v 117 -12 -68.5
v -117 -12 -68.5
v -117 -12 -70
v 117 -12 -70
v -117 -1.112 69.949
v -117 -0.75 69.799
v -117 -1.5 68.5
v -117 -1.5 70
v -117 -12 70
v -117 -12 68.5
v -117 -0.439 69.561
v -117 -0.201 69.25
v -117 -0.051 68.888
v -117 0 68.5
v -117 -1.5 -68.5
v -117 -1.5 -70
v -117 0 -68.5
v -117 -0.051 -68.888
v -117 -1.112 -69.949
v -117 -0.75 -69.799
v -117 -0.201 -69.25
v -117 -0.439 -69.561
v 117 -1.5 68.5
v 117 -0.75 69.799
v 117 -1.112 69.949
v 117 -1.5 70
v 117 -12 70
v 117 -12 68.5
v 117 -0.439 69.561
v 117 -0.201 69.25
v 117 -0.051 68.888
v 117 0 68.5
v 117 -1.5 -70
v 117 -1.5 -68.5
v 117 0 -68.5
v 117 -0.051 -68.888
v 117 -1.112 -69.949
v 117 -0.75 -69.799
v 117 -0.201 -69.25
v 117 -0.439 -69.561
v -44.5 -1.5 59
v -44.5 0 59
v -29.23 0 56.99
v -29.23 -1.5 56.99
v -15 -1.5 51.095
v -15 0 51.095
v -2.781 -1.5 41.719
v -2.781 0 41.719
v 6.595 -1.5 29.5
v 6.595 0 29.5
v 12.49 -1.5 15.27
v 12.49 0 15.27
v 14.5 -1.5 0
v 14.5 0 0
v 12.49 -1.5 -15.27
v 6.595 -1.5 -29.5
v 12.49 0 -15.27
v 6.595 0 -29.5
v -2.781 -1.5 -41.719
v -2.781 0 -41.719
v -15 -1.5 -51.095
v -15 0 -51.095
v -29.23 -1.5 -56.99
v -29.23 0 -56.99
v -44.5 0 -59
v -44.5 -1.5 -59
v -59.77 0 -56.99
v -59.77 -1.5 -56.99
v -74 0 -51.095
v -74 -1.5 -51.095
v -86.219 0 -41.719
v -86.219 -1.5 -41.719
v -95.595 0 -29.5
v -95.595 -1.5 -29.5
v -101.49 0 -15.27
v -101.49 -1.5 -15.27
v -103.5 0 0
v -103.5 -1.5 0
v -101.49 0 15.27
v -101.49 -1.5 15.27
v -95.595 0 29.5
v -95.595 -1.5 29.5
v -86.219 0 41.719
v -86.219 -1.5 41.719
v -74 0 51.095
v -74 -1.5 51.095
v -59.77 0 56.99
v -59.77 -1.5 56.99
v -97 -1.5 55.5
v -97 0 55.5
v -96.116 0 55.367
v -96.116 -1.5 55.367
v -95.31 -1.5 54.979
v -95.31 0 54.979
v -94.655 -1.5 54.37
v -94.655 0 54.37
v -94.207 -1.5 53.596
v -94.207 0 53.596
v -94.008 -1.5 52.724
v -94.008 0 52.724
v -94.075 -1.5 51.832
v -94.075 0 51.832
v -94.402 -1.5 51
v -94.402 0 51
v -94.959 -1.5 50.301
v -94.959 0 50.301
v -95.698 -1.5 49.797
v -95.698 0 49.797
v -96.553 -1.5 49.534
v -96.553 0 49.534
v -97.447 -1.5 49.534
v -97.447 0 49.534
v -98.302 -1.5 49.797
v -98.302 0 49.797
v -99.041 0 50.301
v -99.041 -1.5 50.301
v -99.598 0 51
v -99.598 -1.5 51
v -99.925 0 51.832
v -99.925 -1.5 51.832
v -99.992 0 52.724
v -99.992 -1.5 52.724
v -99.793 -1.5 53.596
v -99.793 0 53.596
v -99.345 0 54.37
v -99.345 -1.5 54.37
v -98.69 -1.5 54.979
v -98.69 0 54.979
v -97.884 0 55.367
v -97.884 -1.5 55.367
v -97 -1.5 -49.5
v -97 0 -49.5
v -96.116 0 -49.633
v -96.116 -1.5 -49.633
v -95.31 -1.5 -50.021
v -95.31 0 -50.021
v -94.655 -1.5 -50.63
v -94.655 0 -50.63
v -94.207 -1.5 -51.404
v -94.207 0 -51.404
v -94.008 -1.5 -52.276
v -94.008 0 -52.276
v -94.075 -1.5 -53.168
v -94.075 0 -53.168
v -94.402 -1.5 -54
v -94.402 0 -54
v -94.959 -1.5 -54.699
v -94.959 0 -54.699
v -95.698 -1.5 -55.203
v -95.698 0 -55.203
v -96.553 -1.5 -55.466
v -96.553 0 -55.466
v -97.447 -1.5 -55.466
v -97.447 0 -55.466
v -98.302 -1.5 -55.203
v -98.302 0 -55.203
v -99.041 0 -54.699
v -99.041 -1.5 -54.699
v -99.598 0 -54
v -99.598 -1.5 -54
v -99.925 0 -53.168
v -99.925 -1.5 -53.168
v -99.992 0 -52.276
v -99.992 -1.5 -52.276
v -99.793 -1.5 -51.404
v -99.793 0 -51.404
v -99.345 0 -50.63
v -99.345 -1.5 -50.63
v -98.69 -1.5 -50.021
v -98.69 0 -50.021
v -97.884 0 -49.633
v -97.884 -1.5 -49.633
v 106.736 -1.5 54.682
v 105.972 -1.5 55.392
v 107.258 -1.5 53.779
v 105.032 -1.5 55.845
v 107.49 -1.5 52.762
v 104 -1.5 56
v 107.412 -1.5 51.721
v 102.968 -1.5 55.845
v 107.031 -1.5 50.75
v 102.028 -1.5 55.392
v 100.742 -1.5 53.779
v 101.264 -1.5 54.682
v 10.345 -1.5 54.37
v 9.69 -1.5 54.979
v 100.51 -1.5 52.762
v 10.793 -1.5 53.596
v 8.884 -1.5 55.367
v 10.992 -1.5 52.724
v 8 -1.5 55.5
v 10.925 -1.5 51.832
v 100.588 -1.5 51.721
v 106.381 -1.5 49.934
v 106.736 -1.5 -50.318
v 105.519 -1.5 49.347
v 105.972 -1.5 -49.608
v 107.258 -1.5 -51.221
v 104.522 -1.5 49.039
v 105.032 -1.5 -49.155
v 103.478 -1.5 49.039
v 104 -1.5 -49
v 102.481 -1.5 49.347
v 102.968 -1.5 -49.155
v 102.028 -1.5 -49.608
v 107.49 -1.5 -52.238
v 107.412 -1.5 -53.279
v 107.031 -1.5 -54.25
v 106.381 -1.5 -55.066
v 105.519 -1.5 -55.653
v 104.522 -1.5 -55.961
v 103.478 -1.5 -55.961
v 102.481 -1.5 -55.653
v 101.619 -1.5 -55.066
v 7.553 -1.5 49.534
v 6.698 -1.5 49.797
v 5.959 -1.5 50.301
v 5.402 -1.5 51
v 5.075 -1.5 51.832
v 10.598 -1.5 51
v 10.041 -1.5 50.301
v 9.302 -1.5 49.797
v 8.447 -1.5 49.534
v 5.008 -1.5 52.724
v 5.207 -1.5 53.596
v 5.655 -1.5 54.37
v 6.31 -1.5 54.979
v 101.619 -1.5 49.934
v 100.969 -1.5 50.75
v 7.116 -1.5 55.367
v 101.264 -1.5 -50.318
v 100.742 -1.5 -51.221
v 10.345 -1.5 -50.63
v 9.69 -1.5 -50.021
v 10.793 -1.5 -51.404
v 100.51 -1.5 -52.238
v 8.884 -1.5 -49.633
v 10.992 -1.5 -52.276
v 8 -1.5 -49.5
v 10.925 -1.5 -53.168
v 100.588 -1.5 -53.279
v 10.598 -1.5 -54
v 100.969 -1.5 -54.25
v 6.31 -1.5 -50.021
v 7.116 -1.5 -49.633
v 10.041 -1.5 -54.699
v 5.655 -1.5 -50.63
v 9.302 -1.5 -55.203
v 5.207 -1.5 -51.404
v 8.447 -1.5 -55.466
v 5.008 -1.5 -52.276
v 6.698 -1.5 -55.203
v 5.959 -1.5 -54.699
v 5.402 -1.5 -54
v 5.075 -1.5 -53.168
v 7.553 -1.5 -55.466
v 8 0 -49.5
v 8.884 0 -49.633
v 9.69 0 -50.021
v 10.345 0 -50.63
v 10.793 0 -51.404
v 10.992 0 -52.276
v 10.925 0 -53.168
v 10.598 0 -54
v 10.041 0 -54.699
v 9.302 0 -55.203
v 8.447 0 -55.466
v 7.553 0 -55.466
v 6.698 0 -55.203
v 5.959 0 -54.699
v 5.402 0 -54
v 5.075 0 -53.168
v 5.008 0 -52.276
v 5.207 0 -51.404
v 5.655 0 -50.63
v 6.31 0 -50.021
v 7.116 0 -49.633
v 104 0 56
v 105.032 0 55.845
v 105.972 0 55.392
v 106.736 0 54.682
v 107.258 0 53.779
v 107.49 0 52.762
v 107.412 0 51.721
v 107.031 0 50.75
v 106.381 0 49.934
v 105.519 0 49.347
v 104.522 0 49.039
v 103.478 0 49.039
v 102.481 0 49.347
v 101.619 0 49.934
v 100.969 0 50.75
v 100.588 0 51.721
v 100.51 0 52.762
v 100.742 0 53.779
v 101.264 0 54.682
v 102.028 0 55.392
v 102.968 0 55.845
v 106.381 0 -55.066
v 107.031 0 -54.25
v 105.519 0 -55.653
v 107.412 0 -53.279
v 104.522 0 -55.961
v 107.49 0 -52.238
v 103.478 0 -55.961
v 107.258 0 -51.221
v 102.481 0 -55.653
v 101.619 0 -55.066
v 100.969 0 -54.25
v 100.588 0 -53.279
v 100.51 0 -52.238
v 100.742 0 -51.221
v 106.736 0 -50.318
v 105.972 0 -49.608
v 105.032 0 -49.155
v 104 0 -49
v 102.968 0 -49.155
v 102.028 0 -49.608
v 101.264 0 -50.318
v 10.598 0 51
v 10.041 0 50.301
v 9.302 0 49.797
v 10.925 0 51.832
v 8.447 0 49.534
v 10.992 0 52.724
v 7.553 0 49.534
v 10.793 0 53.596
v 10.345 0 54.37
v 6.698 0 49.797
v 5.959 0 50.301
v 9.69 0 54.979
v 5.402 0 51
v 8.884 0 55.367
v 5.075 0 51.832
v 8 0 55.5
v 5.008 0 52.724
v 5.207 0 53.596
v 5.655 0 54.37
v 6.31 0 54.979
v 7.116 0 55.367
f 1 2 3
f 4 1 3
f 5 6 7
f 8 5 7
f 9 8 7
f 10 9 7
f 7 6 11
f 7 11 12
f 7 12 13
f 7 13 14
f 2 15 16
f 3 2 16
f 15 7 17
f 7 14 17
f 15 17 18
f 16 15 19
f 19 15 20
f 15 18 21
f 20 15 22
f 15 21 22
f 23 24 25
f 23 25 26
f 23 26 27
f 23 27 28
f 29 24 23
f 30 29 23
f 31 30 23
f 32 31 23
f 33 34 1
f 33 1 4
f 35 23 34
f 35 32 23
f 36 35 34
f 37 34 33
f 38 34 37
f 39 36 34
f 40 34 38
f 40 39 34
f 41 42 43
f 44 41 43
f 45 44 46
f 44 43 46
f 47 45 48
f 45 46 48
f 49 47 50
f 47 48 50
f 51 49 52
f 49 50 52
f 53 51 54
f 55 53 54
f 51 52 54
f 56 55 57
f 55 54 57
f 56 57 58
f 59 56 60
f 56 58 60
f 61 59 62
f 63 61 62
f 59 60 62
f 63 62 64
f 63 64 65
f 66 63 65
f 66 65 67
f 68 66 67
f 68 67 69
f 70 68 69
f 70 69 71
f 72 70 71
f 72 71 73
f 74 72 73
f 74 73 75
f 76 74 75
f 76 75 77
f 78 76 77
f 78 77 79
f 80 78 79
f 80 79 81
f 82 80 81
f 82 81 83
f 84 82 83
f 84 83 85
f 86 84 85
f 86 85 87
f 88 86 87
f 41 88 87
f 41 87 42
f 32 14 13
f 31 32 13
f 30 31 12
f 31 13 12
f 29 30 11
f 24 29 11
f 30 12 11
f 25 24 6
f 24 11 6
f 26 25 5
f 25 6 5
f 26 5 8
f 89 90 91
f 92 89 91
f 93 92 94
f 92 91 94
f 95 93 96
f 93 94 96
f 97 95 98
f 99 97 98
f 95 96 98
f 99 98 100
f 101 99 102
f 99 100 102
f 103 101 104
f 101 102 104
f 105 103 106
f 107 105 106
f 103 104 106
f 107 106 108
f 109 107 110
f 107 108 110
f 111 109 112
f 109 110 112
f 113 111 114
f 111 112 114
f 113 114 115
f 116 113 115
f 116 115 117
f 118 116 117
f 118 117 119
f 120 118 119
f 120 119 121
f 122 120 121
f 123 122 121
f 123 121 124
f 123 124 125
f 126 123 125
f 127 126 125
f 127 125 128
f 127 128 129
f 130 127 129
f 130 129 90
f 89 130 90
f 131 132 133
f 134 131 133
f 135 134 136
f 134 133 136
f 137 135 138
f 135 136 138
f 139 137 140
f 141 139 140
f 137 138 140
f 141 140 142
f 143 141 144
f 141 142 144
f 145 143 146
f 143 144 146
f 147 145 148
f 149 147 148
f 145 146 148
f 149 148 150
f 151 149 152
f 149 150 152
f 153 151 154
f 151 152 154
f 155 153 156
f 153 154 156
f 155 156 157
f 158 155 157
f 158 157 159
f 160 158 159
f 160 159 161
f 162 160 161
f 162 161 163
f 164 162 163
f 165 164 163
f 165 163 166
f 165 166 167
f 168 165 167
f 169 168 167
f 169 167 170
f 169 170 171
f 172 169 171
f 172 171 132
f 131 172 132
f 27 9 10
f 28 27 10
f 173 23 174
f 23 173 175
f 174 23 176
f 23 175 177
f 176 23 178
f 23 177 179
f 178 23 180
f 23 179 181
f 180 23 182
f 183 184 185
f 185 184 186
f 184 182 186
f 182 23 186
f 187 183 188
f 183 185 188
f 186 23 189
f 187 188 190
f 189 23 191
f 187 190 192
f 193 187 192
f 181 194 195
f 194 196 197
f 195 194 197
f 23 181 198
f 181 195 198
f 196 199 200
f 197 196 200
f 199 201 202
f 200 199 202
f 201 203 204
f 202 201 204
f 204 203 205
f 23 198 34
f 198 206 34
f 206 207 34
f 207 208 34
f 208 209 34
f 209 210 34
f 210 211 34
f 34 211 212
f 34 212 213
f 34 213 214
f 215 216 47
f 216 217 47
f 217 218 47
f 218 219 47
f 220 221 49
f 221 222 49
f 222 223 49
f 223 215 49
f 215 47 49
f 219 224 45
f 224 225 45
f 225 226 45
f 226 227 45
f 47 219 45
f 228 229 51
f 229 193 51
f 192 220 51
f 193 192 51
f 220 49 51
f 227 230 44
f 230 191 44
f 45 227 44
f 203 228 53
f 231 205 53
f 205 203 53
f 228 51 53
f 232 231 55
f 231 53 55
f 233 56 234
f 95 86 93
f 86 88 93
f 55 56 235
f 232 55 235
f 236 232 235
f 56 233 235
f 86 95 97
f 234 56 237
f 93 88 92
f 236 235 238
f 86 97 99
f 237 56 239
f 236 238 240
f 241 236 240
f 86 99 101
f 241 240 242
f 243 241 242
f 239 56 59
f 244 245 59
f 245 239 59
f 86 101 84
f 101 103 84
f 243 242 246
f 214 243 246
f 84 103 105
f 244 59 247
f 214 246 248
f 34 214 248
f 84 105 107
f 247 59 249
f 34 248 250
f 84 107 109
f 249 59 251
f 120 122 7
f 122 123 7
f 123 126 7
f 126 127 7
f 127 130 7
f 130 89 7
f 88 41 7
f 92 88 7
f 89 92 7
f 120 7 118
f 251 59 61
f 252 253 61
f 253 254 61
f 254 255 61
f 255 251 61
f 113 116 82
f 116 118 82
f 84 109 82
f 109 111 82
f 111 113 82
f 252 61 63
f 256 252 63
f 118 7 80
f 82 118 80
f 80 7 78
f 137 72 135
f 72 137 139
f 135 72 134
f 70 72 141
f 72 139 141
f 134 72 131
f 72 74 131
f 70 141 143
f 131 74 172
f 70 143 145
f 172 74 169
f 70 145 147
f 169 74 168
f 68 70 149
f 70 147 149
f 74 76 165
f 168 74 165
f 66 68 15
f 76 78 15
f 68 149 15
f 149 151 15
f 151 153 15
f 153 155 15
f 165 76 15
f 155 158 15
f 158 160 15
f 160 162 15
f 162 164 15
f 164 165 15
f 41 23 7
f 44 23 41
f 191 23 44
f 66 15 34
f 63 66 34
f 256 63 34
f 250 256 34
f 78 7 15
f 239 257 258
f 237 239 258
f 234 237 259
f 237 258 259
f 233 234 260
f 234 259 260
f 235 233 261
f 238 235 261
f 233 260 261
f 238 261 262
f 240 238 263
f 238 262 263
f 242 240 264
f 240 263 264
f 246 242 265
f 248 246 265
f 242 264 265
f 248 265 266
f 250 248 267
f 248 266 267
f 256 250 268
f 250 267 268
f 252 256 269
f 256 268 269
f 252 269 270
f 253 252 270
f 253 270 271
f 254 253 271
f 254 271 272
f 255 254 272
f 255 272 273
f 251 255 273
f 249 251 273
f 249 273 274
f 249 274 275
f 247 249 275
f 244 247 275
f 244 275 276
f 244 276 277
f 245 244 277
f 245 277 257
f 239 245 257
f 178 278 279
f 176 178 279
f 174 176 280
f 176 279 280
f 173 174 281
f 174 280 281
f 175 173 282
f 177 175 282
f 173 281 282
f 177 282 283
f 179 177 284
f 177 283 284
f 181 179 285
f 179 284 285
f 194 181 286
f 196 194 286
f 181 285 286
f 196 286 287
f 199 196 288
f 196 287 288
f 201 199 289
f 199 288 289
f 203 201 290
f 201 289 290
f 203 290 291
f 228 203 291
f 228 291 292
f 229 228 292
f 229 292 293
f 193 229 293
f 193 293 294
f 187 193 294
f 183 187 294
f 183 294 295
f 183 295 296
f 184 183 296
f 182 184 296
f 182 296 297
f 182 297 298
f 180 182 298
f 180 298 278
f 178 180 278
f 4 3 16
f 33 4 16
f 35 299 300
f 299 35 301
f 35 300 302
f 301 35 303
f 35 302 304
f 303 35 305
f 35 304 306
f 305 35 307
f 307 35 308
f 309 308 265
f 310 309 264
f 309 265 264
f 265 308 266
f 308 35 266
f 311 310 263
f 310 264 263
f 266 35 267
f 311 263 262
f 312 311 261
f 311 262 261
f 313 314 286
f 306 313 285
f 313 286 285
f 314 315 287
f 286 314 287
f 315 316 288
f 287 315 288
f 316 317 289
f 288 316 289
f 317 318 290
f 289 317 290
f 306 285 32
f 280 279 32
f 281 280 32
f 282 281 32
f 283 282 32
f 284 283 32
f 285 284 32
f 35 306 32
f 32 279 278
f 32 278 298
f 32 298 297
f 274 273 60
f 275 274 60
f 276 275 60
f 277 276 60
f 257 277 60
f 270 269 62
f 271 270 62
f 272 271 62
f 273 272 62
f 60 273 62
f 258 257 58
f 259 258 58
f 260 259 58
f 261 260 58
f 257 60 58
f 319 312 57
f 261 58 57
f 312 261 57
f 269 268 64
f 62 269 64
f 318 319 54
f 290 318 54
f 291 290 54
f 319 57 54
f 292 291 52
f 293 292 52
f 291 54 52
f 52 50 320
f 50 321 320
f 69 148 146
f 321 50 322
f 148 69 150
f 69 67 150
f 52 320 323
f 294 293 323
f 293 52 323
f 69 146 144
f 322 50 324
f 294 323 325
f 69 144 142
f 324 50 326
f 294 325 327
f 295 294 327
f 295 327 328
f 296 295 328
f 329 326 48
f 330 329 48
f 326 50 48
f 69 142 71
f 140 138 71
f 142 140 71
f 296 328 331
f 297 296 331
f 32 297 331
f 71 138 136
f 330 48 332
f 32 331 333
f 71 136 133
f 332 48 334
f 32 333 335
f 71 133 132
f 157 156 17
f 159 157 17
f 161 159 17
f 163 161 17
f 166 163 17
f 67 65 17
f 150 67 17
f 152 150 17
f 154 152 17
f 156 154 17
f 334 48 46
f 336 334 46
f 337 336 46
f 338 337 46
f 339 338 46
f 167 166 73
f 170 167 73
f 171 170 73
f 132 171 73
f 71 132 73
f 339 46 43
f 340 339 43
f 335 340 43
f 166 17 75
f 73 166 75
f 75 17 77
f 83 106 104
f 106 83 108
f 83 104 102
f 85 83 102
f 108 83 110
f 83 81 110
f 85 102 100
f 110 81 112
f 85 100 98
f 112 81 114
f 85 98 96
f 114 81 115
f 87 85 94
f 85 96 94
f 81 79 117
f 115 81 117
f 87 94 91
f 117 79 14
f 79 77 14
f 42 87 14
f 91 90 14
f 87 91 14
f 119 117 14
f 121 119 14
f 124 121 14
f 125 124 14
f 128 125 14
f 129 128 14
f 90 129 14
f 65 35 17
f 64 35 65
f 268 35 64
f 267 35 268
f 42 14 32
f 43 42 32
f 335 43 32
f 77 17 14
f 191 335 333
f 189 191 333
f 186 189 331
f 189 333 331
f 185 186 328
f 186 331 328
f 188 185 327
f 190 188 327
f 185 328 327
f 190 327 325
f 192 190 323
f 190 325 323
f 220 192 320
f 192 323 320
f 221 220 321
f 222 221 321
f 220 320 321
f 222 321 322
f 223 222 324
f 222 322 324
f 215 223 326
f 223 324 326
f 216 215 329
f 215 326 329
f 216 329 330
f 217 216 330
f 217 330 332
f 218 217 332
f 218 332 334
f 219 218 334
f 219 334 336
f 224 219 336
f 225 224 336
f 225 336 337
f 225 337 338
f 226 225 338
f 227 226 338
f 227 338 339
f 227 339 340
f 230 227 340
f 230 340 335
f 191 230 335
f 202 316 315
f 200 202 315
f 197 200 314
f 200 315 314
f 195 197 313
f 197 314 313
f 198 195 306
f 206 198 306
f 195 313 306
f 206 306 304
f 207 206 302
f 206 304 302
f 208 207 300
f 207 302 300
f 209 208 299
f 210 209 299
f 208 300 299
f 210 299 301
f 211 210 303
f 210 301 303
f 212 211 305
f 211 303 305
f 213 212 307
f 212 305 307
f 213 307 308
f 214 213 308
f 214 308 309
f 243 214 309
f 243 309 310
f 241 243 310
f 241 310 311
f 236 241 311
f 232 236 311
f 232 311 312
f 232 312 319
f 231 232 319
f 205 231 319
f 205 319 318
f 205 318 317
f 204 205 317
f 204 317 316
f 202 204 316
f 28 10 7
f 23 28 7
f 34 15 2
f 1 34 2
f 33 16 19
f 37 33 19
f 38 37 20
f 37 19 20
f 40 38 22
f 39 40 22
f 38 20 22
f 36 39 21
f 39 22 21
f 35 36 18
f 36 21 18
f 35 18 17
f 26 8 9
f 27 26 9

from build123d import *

# Parameters (mm, degrees)
SM_START               = -117
SM_BASE_FLANGE_1_DEPTH = 234
SKETCH_7_R             = 59
SKETCH_7_R_2           = 3
SKETCH_7_R_3           = 3.5
CUT_EXTRUDE_1_DEPTH    = 137.868550076


# Read off the part's stored shape, not the designer's step: 基体-法兰1
with BuildPart() as part:
    # 基体-法兰1 outline → 基体-法兰1 (new body)
    with BuildSketch(Plane(origin=(0, 0, 0), x_dir=(0, 0, -1), z_dir=(1, 0, 0)).offset(SM_START)):
        with BuildLine():
            Line((68.5, -1.5), (68.5, -12))
            Line((68.5, -12), (70, -12))
            Line((70, -12), (70, -1.5))
            ThreePointArc((70, -1.5), (69.560660172, -0.439339828), (68.5, 0))
            Line((68.5, 0), (-68.5, 0))
            ThreePointArc((-68.5, 0), (-69.560660172, -0.439339828), (-70, -1.5))
            Line((-70, -1.5), (-70, -12))
            Line((-70, -12), (-68.5, -12))
            Line((-68.5, -12), (-68.5, -1.5))
            Line((-68.5, -1.5), (68.5, -1.5))
        make_face()
    extrude(amount=SM_BASE_FLANGE_1_DEPTH)

    # 草图7 → 切除-拉伸1 (cut, through all)
    with BuildSketch(Plane(origin=(0, 0, 0), x_dir=(1, 0, 0), z_dir=(0, 1, 0))):
        with Locations(Location((-44.5, 0, 0), (0, 0, 270))):
            Circle(SKETCH_7_R)
        with Locations(Location((-97, 52.5, 0), (0, 0, 270))):
            Circle(SKETCH_7_R_2)
        with Locations(Location((8, 52.5, 0), (0, 0, 270))):
            Circle(SKETCH_7_R_2)
        with Locations(Location((8, -52.5, 0), (0, 0, 270))):
            Circle(SKETCH_7_R_2)
        with Locations(Location((-97, -52.5, 0), (0, 0, 270))):
            Circle(SKETCH_7_R_2)
        with Locations(Location((104, 52.5, 0), (0, 0, 270))):
            Circle(SKETCH_7_R_3)
        with Locations(Location((104, -52.5, 0), (0, 0, 270))):
            Circle(SKETCH_7_R_3)
    extrude(amount=-CUT_EXTRUDE_1_DEPTH, mode=Mode.SUBTRACT)


solid = part.part
